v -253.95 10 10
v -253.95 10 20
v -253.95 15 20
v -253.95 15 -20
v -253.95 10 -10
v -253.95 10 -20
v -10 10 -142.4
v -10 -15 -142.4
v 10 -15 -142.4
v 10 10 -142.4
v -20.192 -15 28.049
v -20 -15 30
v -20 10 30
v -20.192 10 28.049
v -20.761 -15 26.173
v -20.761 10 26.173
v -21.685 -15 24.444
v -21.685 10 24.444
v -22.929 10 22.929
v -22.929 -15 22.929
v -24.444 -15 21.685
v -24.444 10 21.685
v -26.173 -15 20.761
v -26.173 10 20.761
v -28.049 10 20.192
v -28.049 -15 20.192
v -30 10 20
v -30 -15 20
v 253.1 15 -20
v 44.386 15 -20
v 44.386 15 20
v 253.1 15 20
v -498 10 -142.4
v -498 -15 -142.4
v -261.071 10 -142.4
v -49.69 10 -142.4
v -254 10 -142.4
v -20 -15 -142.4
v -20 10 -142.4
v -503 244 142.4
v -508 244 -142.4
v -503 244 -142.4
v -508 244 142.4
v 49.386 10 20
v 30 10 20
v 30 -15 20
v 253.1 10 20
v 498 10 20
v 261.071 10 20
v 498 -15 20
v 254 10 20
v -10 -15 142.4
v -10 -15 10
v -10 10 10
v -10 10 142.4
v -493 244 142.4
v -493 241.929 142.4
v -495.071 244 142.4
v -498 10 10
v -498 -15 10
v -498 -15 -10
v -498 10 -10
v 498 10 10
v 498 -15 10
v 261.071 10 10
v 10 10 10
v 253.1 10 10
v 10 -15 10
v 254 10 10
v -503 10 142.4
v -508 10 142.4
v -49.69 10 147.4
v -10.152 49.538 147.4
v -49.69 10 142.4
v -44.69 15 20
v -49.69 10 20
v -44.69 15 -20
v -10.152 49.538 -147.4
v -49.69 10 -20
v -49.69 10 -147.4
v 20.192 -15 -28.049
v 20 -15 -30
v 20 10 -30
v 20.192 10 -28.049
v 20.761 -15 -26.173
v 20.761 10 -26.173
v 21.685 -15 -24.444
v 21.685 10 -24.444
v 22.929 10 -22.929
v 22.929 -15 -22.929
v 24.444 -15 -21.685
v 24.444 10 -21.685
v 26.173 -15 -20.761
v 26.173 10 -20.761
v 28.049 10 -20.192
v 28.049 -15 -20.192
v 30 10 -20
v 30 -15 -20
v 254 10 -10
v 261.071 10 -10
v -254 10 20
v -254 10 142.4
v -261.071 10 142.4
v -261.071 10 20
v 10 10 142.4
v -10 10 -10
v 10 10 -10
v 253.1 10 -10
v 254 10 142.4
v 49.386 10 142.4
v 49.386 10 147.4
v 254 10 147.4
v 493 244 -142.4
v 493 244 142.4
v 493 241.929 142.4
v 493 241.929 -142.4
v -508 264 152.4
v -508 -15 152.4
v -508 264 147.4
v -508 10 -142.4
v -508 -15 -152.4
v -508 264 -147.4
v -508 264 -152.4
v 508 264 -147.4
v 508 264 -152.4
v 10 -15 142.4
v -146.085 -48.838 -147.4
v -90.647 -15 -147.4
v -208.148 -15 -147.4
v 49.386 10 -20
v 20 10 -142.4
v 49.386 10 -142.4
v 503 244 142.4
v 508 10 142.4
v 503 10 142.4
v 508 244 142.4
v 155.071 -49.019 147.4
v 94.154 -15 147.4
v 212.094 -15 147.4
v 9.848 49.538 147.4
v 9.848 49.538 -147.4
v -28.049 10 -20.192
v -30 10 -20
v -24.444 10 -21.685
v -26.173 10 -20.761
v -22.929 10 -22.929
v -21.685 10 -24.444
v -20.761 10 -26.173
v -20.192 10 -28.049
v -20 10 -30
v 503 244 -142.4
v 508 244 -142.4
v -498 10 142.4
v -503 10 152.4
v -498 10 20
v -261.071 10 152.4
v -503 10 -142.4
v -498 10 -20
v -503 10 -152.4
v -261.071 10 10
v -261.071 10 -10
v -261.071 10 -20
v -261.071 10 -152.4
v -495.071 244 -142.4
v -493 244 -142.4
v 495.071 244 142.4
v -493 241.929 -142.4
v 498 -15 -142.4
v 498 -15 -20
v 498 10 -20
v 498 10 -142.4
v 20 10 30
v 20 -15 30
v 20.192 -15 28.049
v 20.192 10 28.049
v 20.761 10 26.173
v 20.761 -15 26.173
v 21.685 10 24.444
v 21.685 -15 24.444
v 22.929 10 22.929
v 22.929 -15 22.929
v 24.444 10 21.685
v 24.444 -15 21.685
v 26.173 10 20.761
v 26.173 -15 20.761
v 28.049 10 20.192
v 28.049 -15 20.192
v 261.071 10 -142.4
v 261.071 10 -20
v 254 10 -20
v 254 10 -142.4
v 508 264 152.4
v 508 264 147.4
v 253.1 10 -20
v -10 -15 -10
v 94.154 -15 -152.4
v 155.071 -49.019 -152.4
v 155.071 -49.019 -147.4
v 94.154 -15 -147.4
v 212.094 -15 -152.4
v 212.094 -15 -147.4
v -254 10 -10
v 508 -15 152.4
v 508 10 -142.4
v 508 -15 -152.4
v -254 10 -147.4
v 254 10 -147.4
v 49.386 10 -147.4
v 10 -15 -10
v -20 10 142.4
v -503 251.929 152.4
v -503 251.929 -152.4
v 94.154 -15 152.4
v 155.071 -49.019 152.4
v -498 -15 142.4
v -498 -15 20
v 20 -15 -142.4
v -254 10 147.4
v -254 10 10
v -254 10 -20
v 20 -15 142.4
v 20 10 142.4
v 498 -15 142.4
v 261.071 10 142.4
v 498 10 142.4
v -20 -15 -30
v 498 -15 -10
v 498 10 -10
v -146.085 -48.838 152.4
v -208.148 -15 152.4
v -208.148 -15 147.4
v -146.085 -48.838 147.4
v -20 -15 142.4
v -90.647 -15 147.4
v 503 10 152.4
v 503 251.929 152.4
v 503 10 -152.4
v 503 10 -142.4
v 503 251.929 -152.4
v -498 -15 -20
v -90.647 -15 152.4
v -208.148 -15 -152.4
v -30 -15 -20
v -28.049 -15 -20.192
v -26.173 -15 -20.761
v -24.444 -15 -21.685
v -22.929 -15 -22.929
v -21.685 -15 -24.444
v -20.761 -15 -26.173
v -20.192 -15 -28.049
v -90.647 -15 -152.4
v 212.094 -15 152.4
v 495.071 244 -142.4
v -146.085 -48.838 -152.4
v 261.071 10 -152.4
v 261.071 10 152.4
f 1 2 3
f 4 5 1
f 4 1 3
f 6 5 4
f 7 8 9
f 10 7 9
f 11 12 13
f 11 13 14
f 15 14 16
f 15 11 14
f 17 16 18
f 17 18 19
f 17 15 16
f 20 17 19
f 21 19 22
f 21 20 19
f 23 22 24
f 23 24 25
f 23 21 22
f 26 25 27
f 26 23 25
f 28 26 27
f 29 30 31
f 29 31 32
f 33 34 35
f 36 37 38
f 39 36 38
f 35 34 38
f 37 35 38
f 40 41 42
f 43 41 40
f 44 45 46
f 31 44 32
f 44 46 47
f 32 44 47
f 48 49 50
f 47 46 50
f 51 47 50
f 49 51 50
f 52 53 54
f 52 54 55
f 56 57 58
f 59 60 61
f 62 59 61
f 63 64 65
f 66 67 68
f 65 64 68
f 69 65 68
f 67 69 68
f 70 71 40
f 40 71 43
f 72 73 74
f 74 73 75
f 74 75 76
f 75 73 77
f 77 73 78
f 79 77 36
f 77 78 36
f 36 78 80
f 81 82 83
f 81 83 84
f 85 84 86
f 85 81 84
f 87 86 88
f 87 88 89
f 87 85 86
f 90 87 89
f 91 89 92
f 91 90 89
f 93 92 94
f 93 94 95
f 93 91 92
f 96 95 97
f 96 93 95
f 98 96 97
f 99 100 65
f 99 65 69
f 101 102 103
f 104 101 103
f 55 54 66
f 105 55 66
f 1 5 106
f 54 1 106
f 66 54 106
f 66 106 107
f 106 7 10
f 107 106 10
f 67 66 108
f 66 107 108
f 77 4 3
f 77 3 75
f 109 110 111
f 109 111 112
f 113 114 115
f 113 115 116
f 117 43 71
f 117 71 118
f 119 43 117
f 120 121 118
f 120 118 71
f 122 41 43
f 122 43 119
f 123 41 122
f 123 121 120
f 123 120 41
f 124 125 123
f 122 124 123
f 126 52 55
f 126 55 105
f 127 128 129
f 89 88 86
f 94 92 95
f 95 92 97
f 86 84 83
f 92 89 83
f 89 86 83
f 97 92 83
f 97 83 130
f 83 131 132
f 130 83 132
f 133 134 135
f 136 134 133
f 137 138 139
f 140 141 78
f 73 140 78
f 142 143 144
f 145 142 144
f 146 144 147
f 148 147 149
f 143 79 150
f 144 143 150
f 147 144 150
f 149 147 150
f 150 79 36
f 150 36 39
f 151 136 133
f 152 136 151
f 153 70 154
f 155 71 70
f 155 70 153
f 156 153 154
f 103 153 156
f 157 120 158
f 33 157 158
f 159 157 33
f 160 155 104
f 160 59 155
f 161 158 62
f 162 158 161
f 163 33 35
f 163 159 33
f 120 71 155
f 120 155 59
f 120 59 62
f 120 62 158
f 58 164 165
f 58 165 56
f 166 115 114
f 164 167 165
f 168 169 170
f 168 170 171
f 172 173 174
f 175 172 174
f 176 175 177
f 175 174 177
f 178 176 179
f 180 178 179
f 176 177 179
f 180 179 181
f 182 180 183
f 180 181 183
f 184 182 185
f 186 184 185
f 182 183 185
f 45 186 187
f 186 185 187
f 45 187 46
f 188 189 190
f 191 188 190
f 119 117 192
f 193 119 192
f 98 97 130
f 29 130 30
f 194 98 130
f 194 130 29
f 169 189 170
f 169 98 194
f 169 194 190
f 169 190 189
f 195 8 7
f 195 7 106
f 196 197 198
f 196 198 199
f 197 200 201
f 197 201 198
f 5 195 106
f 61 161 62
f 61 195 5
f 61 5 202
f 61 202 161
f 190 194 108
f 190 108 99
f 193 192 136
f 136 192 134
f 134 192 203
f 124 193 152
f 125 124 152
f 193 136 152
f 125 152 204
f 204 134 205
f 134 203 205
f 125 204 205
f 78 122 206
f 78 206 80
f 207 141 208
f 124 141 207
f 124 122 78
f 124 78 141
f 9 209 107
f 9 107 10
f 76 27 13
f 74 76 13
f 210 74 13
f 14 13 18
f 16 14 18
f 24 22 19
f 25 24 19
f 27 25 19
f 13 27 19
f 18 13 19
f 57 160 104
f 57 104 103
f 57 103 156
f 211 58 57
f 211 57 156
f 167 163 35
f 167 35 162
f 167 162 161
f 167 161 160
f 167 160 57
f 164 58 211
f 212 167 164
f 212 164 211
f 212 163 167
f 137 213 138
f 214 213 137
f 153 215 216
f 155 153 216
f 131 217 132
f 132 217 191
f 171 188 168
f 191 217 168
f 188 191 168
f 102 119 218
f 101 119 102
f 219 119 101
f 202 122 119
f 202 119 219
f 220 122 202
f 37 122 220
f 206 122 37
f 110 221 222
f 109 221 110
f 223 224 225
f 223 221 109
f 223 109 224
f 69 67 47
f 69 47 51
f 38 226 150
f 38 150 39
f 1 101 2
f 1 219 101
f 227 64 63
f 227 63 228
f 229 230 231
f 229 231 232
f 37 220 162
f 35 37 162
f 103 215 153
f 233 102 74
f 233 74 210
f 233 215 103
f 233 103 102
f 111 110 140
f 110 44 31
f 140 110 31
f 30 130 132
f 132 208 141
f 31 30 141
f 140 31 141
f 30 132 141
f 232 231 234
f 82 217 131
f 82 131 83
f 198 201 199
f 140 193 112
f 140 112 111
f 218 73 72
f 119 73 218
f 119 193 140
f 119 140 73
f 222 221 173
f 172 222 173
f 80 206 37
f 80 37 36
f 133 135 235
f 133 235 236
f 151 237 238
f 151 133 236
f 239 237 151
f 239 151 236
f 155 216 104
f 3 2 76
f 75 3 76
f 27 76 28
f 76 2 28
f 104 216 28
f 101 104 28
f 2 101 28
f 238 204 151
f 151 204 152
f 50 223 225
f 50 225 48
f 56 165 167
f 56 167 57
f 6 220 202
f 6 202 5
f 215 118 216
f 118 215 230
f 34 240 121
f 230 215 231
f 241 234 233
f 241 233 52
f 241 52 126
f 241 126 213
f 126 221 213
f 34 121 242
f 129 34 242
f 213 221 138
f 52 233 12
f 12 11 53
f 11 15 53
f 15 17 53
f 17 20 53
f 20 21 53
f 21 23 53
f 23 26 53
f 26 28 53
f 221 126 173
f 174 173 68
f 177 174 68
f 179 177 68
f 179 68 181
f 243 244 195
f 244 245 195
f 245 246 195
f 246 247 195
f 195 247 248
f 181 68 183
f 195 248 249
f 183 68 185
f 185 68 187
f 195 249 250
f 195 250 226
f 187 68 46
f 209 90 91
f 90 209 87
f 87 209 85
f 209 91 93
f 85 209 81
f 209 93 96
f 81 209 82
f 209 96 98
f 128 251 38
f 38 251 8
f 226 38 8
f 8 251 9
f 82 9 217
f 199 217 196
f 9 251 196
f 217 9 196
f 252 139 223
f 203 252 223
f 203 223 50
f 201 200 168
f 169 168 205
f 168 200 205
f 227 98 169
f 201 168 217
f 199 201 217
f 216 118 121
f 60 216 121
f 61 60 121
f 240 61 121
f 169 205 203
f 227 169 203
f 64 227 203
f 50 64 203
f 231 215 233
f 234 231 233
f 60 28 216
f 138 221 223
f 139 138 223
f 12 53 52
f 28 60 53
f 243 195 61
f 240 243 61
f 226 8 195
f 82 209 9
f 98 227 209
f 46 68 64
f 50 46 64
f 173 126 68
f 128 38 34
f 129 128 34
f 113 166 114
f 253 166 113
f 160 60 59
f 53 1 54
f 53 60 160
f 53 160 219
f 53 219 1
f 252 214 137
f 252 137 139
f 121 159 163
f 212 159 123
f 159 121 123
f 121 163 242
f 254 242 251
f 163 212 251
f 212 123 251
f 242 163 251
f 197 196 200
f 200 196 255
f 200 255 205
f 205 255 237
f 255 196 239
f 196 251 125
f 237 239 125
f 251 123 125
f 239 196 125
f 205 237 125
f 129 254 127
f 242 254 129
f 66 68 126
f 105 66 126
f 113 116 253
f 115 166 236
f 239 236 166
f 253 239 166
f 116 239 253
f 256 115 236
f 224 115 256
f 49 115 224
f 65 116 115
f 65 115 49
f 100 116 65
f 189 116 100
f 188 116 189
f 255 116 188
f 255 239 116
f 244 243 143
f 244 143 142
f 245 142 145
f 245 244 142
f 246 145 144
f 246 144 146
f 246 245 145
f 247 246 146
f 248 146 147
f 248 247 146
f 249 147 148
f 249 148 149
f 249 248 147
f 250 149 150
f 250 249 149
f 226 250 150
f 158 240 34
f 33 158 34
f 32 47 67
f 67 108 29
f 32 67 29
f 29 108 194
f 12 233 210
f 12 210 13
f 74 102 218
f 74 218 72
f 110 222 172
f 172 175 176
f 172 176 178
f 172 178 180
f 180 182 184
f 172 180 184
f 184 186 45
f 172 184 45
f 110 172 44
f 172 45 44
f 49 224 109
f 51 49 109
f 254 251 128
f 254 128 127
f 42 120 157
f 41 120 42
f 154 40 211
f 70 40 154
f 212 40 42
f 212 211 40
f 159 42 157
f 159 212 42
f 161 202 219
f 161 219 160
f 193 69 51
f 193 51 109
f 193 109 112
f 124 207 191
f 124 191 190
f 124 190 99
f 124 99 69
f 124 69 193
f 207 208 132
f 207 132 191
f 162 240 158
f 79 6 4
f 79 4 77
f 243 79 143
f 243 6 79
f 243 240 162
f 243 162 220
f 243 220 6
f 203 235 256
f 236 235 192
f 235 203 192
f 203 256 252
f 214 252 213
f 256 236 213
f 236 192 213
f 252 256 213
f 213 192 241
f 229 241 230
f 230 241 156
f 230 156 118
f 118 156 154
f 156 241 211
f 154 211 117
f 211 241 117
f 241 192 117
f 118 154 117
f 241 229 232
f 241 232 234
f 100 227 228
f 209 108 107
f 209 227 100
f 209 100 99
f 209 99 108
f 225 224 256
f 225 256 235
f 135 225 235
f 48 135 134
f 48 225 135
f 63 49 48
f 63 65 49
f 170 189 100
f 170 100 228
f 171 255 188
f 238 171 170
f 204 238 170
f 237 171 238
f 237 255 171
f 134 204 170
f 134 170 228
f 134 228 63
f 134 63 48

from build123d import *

# Parameters (mm, degrees)
BOSS_EXTRUDE1_DEPTH      = 10
BOSS_EXTRUDE1_DEPTH_BACK = 15
SKETCH1_W                = 1016
SKETCH1_H                = 304.8
SKETCH1_W_2              = 996
SKETCH1_H_2              = 284.8
BOSS_EXTRUDE2_DEPTH      = 10
BOSS_EXTRUDE2_DEPTH_BACK = 15
BOSS_EXTRUDE3_DEPTH      = 152.4
BOSS_EXTRUDE3_DEPTH_BACK = 152.4
SKETCH4_W                = 507.049279033
SKETCH4_H                = 40
BOSS_EXTRUDE7_DEPTH      = 5
SKETCH5_W                = 284.8
SKETCH5_H                = 234
CUT_EXTRUDE1_DEPTH       = 15
SKETCH6_W                = 284.8
SKETCH6_H                = 234
CUT_EXTRUDE2_DEPTH       = 15
BOSS_EXTRUDE8_DEPTH      = 304.8
BOSS_EXTRUDE9_DEPTH      = 5
BOSS_EXTRUDE10_DEPTH     = 5
BOSS_EXTRUDE11_DEPTH     = 5
BOSS_EXTRUDE12_DEPTH     = 5


with BuildPart() as part:
    # Sketch1 → Boss-Extrude1 (new, two sides: drawn at the far end of the back side and taken through both)
    with BuildSketch(Plane(origin=(0, 0, 0), x_dir=(1, 0, 0), z_dir=(0, 1, 0)).offset(-BOSS_EXTRUDE1_DEPTH_BACK)):
        Rectangle(SKETCH1_W, SKETCH1_H)
        Rectangle(SKETCH1_W_2, SKETCH1_H_2, mode=Mode.SUBTRACT)
    extrude(amount=BOSS_EXTRUDE1_DEPTH + BOSS_EXTRUDE1_DEPTH_BACK)

    # Sketch2 → Boss-Extrude2 (add, two sides: drawn at the far end of the back side and taken through both)
    with BuildSketch(Plane(origin=(0, 0, 0), x_dir=(1, 0, 0), z_dir=(0, 1, 0)).offset(-BOSS_EXTRUDE2_DEPTH_BACK)):
        with BuildLine():
            Line((-498, 20), (-30, 20))
            ThreePointArc((-30, 20), (-22.928932188, 22.928932188), (-20, 30))
            Line((-20, 30), (-20, 142.4))
            Line((-20, 142.4), (-10, 142.4))
            Line((-10, 142.4), (-10, 20))
            Line((-10, 20), (-10, 10))
            Line((-10, 10), (-498, 10))
            Line((-498, 10), (-498, 20))
        make_face()
        with BuildLine():
            Line((498, 20), (498, 10))
            Line((498, 10), (10, 10))
            Line((10, 10), (10, 20))
            Line((10, 20), (10, 142.4))
            Line((10, 142.4), (20, 142.4))
            Line((20, 142.4), (20, 30))
            ThreePointArc((20, 30), (22.928932188, 22.928932188), (30, 20))
            Line((30, 20), (498, 20))
        make_face()
        with BuildLine():
            Line((-498, -10), (-10, -10))
            Line((-10, -10), (-10, -20))
            Line((-10, -20), (-10, -142.4))
            Line((-10, -142.4), (-20, -142.4))
            Line((-20, -142.4), (-20, -30))
            ThreePointArc((-20, -30), (-22.928932188, -22.928932188), (-30, -20))
            Line((-30, -20), (-498, -20))
            Line((-498, -20), (-498, -10))
        make_face()
        with BuildLine():
            Line((30, -20), (498, -20))
            Line((498, -20), (498, -10))
            Line((498, -10), (10, -10))
            Line((10, -10), (10, -20))
            Line((10, -20), (10, -142.4))
            Line((10, -142.4), (20, -142.4))
            Line((20, -142.4), (20, -30))
            ThreePointArc((20, -30), (22.928932188, -22.928932188), (30, -20))
        make_face()
    extrude(amount=BOSS_EXTRUDE2_DEPTH + BOSS_EXTRUDE2_DEPTH_BACK)

    # Sketch3 → Boss-Extrude3 (add, two sides: drawn at the far end of the back side and taken through both)
    with BuildSketch(Plane.XY.offset(-BOSS_EXTRUDE3_DEPTH_BACK)):
        Polygon((-508, 10), (-508, 264), (-254, 10), (-261.071067812, 10), (-503, 251.928932188), (-503, 10), align=None)
        Polygon((261.071067812, 10), (254, 10), (508, 264), (508, 10), (503, 10), (503, 251.928932188), align=None)
    extrude(amount=BOSS_EXTRUDE3_DEPTH + BOSS_EXTRUDE3_DEPTH_BACK)

    # Sketch4 → Boss-Extrude7 (add)
    with BuildSketch(Plane(origin=(0, 10, 0), x_dir=(1, 0, 0), z_dir=(0, 1, 0))):
        with Locations((-0.42499269, 0)):
            Rectangle(SKETCH4_W, SKETCH4_H)
    extrude(amount=BOSS_EXTRUDE7_DEPTH)

    # Sketch5 → Cut-Extrude1 (cut)
    with BuildSketch(Plane(origin=(508, 0, 0), x_dir=(0, 0, -1), z_dir=(1, 0, 0))):
        with Locations((0, 127)):
            Rectangle(SKETCH5_W, SKETCH5_H)
    extrude(amount=-CUT_EXTRUDE1_DEPTH, mode=Mode.SUBTRACT)

    # Sketch6 → Cut-Extrude2 (cut)
    with BuildSketch(Plane.ZY.offset(508)):
        with Locations((0, 127)):
            Rectangle(SKETCH6_W, SKETCH6_H)
    extrude(amount=-CUT_EXTRUDE2_DEPTH, mode=Mode.SUBTRACT)

    # Sketch7 → Boss-Extrude8 (add)
    with BuildSketch(Plane(origin=(0, 0, -152.4), x_dir=(-1, 0, 0), z_dir=(0, 0, -1))):
        Polygon((-49.38581657, 10), (-9.847908285, 49.537908285), (10.152091715, 49.537908285), (49.69, 10), align=None)
    extrude(amount=-BOSS_EXTRUDE8_DEPTH)

    # Sketch8 → Boss-Extrude9 (add)
    with BuildSketch(Plane.XY.offset(152.4)):
        Polygon((-508, 264), (508, 264), (254, 10), (-254, 10), align=None)
    extrude(amount=-BOSS_EXTRUDE9_DEPTH)

    # Sketch9 → Boss-Extrude10 (add)
    with BuildSketch(Plane(origin=(0, 0, -152.4), x_dir=(-1, 0, 0), z_dir=(0, 0, -1))):
        Polygon((-508, 264), (508, 264), (254, 10), (-254, 10), align=None)
    extrude(amount=-BOSS_EXTRUDE10_DEPTH)

    # Sketch10 → Boss-Extrude11 (add)
    with BuildSketch(Plane.XY.offset(152.4)):
        Polygon((-254, 10), (-146.084980294, -48.838499263), (-49.69, 10), align=None)
        Polygon((49.38581657, 10), (155.071097682, -49.018715311), (254, 10), align=None)
    extrude(amount=-BOSS_EXTRUDE11_DEPTH)

    # Sketch11 → Boss-Extrude12 (add)
    with BuildSketch(Plane(origin=(0, 0, -152.4), x_dir=(-1, 0, 0), z_dir=(0, 0, -1))):
        Polygon((-212.094266455, -15), (-155.071097682, -49.018715311), (-94.153514645, -15), align=None)
        Polygon((90.647443469, -15), (146.084980294, -48.838499263), (208.147785439, -15), align=None)
    extrude(amount=-BOSS_EXTRUDE12_DEPTH)


solid = part.part
